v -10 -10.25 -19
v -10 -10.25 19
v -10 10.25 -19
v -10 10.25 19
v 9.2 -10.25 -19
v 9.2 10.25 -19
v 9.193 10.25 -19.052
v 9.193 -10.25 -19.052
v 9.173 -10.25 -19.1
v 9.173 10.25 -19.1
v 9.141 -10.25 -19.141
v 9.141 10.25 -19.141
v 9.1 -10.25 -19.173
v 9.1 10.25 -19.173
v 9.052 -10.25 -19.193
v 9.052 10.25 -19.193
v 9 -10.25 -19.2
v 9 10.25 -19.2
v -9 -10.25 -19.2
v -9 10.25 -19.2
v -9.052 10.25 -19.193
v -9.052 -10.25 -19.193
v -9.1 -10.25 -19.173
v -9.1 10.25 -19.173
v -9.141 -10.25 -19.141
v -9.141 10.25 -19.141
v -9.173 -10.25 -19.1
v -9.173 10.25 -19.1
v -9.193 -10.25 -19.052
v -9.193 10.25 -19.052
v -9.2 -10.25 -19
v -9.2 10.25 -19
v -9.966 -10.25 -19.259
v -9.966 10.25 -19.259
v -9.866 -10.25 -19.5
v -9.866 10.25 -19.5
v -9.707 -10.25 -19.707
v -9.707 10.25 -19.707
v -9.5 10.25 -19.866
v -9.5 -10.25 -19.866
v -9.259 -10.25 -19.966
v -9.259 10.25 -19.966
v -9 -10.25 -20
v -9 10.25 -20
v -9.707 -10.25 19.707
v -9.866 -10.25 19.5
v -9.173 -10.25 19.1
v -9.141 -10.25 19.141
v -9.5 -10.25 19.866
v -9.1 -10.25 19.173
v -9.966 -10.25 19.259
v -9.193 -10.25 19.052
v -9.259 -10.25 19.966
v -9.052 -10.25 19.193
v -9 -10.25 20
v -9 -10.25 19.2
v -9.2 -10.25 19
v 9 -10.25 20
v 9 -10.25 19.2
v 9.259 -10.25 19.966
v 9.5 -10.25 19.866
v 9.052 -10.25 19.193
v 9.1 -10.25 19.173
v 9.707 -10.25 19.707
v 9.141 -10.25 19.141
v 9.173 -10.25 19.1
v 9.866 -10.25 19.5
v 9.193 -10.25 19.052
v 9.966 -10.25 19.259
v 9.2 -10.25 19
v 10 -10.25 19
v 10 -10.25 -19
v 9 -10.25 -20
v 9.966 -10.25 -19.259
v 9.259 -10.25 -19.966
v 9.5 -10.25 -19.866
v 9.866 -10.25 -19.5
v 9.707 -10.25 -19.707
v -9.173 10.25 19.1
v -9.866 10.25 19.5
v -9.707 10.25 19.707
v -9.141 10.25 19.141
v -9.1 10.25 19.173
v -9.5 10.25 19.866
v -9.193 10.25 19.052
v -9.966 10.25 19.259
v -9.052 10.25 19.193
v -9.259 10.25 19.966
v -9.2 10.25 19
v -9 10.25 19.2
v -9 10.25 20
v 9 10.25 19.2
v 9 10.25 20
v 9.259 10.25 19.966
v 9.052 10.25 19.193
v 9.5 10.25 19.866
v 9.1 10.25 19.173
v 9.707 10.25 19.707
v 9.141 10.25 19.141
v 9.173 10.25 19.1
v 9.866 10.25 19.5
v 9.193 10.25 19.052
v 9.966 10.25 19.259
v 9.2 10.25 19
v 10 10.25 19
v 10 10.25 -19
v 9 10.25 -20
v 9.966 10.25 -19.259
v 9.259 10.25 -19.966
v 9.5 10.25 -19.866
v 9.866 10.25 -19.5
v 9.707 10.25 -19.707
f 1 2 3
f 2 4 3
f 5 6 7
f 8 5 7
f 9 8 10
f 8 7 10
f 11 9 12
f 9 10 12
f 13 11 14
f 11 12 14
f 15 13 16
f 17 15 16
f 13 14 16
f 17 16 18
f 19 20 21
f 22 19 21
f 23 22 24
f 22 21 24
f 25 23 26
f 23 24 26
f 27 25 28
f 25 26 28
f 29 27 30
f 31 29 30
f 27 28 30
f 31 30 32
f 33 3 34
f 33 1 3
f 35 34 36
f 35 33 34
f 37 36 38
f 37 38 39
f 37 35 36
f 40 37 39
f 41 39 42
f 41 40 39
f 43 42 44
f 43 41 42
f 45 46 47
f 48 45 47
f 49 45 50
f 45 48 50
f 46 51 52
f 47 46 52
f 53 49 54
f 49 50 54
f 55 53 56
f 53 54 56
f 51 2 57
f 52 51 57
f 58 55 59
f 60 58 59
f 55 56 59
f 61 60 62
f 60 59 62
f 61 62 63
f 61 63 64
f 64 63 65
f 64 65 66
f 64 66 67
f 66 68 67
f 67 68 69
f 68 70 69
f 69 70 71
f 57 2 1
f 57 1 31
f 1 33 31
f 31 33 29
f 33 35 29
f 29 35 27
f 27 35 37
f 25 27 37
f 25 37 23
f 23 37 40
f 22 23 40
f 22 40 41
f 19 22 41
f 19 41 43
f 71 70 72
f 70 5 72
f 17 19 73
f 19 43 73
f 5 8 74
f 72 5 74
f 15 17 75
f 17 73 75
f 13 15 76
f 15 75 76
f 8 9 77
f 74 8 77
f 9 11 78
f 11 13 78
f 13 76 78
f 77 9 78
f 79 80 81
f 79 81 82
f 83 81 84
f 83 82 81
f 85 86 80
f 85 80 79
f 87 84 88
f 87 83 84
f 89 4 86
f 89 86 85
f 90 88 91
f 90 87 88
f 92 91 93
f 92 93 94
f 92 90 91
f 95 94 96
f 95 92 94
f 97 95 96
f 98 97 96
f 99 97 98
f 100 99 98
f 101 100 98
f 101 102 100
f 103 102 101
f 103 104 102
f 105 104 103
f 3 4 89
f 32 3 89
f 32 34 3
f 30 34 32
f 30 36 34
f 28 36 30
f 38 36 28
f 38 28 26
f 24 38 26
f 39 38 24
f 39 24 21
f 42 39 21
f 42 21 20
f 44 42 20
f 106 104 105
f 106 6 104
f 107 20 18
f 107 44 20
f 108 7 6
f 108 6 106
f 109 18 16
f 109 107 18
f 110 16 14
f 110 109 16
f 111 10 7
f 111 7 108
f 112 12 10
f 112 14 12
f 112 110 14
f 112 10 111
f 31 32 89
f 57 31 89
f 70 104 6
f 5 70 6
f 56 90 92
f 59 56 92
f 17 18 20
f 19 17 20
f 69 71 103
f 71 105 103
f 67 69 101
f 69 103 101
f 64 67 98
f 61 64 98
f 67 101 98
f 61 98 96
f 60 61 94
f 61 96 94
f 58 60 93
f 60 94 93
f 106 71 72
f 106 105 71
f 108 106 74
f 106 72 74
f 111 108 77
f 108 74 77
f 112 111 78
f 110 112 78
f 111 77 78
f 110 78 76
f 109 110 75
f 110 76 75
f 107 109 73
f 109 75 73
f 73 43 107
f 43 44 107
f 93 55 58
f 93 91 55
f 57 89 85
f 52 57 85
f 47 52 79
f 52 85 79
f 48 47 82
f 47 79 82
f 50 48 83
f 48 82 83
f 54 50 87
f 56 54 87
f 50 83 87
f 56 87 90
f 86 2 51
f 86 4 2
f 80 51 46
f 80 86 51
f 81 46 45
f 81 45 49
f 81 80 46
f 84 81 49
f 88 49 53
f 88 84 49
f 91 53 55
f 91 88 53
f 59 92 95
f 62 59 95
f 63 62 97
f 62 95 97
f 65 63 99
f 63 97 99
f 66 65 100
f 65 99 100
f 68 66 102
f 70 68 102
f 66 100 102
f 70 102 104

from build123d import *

# Parameters (mm, degrees)
BASES_W            = 20
BASES_H            = 40
BASE_DEPTH         = 10.25
BASE_F_R           = 1
CUT_EXTRUDE3_DEPTH = 31.335622624


with BuildPart() as part:
    # BaseS → BASE (new, symmetric)
    with BuildSketch(Plane(origin=(0, 0, 0), x_dir=(1, 0, 0), z_dir=(0, 1, 0))):
        Rectangle(BASES_W, BASES_H)
    extrude(amount=BASE_DEPTH, both=True)

    # BASE F
    base_f_edges = [part.edges().sort_by_distance(p)[0] for p in [
        (10, 0, 20),
        (-10, 0, 20),
        (-10, 0, -20),
        (10, 0, -20),
    ]]
    fillet(base_f_edges, radius=BASE_F_R)

    # PocketS → Cut-Extrude3 (cut, through all)
    with BuildSketch(Plane(origin=(0, 10.25, 0), x_dir=(1, 0, 0), z_dir=(0, 1, 0))):
        with BuildLine():
            Line((9, 19.2), (-9, 19.2))
            ThreePointArc((-9, 19.2), (-9.141421356, 19.141421356), (-9.2, 19))
            Line((-9.2, 19), (-9.2, -19))
            ThreePointArc((-9.2, -19), (-9.141421356, -19.141421356), (-9, -19.2))
            Line((-9, -19.2), (9, -19.2))
            ThreePointArc((9, -19.2), (9.141421356, -19.141421356), (9.2, -19))
            Line((9.2, -19), (9.2, 19))
            ThreePointArc((9.2, 19), (9.141421356, 19.141421356), (9, 19.2))
        make_face()
    extrude(amount=-CUT_EXTRUDE3_DEPTH, mode=Mode.SUBTRACT)


solid = part.part
